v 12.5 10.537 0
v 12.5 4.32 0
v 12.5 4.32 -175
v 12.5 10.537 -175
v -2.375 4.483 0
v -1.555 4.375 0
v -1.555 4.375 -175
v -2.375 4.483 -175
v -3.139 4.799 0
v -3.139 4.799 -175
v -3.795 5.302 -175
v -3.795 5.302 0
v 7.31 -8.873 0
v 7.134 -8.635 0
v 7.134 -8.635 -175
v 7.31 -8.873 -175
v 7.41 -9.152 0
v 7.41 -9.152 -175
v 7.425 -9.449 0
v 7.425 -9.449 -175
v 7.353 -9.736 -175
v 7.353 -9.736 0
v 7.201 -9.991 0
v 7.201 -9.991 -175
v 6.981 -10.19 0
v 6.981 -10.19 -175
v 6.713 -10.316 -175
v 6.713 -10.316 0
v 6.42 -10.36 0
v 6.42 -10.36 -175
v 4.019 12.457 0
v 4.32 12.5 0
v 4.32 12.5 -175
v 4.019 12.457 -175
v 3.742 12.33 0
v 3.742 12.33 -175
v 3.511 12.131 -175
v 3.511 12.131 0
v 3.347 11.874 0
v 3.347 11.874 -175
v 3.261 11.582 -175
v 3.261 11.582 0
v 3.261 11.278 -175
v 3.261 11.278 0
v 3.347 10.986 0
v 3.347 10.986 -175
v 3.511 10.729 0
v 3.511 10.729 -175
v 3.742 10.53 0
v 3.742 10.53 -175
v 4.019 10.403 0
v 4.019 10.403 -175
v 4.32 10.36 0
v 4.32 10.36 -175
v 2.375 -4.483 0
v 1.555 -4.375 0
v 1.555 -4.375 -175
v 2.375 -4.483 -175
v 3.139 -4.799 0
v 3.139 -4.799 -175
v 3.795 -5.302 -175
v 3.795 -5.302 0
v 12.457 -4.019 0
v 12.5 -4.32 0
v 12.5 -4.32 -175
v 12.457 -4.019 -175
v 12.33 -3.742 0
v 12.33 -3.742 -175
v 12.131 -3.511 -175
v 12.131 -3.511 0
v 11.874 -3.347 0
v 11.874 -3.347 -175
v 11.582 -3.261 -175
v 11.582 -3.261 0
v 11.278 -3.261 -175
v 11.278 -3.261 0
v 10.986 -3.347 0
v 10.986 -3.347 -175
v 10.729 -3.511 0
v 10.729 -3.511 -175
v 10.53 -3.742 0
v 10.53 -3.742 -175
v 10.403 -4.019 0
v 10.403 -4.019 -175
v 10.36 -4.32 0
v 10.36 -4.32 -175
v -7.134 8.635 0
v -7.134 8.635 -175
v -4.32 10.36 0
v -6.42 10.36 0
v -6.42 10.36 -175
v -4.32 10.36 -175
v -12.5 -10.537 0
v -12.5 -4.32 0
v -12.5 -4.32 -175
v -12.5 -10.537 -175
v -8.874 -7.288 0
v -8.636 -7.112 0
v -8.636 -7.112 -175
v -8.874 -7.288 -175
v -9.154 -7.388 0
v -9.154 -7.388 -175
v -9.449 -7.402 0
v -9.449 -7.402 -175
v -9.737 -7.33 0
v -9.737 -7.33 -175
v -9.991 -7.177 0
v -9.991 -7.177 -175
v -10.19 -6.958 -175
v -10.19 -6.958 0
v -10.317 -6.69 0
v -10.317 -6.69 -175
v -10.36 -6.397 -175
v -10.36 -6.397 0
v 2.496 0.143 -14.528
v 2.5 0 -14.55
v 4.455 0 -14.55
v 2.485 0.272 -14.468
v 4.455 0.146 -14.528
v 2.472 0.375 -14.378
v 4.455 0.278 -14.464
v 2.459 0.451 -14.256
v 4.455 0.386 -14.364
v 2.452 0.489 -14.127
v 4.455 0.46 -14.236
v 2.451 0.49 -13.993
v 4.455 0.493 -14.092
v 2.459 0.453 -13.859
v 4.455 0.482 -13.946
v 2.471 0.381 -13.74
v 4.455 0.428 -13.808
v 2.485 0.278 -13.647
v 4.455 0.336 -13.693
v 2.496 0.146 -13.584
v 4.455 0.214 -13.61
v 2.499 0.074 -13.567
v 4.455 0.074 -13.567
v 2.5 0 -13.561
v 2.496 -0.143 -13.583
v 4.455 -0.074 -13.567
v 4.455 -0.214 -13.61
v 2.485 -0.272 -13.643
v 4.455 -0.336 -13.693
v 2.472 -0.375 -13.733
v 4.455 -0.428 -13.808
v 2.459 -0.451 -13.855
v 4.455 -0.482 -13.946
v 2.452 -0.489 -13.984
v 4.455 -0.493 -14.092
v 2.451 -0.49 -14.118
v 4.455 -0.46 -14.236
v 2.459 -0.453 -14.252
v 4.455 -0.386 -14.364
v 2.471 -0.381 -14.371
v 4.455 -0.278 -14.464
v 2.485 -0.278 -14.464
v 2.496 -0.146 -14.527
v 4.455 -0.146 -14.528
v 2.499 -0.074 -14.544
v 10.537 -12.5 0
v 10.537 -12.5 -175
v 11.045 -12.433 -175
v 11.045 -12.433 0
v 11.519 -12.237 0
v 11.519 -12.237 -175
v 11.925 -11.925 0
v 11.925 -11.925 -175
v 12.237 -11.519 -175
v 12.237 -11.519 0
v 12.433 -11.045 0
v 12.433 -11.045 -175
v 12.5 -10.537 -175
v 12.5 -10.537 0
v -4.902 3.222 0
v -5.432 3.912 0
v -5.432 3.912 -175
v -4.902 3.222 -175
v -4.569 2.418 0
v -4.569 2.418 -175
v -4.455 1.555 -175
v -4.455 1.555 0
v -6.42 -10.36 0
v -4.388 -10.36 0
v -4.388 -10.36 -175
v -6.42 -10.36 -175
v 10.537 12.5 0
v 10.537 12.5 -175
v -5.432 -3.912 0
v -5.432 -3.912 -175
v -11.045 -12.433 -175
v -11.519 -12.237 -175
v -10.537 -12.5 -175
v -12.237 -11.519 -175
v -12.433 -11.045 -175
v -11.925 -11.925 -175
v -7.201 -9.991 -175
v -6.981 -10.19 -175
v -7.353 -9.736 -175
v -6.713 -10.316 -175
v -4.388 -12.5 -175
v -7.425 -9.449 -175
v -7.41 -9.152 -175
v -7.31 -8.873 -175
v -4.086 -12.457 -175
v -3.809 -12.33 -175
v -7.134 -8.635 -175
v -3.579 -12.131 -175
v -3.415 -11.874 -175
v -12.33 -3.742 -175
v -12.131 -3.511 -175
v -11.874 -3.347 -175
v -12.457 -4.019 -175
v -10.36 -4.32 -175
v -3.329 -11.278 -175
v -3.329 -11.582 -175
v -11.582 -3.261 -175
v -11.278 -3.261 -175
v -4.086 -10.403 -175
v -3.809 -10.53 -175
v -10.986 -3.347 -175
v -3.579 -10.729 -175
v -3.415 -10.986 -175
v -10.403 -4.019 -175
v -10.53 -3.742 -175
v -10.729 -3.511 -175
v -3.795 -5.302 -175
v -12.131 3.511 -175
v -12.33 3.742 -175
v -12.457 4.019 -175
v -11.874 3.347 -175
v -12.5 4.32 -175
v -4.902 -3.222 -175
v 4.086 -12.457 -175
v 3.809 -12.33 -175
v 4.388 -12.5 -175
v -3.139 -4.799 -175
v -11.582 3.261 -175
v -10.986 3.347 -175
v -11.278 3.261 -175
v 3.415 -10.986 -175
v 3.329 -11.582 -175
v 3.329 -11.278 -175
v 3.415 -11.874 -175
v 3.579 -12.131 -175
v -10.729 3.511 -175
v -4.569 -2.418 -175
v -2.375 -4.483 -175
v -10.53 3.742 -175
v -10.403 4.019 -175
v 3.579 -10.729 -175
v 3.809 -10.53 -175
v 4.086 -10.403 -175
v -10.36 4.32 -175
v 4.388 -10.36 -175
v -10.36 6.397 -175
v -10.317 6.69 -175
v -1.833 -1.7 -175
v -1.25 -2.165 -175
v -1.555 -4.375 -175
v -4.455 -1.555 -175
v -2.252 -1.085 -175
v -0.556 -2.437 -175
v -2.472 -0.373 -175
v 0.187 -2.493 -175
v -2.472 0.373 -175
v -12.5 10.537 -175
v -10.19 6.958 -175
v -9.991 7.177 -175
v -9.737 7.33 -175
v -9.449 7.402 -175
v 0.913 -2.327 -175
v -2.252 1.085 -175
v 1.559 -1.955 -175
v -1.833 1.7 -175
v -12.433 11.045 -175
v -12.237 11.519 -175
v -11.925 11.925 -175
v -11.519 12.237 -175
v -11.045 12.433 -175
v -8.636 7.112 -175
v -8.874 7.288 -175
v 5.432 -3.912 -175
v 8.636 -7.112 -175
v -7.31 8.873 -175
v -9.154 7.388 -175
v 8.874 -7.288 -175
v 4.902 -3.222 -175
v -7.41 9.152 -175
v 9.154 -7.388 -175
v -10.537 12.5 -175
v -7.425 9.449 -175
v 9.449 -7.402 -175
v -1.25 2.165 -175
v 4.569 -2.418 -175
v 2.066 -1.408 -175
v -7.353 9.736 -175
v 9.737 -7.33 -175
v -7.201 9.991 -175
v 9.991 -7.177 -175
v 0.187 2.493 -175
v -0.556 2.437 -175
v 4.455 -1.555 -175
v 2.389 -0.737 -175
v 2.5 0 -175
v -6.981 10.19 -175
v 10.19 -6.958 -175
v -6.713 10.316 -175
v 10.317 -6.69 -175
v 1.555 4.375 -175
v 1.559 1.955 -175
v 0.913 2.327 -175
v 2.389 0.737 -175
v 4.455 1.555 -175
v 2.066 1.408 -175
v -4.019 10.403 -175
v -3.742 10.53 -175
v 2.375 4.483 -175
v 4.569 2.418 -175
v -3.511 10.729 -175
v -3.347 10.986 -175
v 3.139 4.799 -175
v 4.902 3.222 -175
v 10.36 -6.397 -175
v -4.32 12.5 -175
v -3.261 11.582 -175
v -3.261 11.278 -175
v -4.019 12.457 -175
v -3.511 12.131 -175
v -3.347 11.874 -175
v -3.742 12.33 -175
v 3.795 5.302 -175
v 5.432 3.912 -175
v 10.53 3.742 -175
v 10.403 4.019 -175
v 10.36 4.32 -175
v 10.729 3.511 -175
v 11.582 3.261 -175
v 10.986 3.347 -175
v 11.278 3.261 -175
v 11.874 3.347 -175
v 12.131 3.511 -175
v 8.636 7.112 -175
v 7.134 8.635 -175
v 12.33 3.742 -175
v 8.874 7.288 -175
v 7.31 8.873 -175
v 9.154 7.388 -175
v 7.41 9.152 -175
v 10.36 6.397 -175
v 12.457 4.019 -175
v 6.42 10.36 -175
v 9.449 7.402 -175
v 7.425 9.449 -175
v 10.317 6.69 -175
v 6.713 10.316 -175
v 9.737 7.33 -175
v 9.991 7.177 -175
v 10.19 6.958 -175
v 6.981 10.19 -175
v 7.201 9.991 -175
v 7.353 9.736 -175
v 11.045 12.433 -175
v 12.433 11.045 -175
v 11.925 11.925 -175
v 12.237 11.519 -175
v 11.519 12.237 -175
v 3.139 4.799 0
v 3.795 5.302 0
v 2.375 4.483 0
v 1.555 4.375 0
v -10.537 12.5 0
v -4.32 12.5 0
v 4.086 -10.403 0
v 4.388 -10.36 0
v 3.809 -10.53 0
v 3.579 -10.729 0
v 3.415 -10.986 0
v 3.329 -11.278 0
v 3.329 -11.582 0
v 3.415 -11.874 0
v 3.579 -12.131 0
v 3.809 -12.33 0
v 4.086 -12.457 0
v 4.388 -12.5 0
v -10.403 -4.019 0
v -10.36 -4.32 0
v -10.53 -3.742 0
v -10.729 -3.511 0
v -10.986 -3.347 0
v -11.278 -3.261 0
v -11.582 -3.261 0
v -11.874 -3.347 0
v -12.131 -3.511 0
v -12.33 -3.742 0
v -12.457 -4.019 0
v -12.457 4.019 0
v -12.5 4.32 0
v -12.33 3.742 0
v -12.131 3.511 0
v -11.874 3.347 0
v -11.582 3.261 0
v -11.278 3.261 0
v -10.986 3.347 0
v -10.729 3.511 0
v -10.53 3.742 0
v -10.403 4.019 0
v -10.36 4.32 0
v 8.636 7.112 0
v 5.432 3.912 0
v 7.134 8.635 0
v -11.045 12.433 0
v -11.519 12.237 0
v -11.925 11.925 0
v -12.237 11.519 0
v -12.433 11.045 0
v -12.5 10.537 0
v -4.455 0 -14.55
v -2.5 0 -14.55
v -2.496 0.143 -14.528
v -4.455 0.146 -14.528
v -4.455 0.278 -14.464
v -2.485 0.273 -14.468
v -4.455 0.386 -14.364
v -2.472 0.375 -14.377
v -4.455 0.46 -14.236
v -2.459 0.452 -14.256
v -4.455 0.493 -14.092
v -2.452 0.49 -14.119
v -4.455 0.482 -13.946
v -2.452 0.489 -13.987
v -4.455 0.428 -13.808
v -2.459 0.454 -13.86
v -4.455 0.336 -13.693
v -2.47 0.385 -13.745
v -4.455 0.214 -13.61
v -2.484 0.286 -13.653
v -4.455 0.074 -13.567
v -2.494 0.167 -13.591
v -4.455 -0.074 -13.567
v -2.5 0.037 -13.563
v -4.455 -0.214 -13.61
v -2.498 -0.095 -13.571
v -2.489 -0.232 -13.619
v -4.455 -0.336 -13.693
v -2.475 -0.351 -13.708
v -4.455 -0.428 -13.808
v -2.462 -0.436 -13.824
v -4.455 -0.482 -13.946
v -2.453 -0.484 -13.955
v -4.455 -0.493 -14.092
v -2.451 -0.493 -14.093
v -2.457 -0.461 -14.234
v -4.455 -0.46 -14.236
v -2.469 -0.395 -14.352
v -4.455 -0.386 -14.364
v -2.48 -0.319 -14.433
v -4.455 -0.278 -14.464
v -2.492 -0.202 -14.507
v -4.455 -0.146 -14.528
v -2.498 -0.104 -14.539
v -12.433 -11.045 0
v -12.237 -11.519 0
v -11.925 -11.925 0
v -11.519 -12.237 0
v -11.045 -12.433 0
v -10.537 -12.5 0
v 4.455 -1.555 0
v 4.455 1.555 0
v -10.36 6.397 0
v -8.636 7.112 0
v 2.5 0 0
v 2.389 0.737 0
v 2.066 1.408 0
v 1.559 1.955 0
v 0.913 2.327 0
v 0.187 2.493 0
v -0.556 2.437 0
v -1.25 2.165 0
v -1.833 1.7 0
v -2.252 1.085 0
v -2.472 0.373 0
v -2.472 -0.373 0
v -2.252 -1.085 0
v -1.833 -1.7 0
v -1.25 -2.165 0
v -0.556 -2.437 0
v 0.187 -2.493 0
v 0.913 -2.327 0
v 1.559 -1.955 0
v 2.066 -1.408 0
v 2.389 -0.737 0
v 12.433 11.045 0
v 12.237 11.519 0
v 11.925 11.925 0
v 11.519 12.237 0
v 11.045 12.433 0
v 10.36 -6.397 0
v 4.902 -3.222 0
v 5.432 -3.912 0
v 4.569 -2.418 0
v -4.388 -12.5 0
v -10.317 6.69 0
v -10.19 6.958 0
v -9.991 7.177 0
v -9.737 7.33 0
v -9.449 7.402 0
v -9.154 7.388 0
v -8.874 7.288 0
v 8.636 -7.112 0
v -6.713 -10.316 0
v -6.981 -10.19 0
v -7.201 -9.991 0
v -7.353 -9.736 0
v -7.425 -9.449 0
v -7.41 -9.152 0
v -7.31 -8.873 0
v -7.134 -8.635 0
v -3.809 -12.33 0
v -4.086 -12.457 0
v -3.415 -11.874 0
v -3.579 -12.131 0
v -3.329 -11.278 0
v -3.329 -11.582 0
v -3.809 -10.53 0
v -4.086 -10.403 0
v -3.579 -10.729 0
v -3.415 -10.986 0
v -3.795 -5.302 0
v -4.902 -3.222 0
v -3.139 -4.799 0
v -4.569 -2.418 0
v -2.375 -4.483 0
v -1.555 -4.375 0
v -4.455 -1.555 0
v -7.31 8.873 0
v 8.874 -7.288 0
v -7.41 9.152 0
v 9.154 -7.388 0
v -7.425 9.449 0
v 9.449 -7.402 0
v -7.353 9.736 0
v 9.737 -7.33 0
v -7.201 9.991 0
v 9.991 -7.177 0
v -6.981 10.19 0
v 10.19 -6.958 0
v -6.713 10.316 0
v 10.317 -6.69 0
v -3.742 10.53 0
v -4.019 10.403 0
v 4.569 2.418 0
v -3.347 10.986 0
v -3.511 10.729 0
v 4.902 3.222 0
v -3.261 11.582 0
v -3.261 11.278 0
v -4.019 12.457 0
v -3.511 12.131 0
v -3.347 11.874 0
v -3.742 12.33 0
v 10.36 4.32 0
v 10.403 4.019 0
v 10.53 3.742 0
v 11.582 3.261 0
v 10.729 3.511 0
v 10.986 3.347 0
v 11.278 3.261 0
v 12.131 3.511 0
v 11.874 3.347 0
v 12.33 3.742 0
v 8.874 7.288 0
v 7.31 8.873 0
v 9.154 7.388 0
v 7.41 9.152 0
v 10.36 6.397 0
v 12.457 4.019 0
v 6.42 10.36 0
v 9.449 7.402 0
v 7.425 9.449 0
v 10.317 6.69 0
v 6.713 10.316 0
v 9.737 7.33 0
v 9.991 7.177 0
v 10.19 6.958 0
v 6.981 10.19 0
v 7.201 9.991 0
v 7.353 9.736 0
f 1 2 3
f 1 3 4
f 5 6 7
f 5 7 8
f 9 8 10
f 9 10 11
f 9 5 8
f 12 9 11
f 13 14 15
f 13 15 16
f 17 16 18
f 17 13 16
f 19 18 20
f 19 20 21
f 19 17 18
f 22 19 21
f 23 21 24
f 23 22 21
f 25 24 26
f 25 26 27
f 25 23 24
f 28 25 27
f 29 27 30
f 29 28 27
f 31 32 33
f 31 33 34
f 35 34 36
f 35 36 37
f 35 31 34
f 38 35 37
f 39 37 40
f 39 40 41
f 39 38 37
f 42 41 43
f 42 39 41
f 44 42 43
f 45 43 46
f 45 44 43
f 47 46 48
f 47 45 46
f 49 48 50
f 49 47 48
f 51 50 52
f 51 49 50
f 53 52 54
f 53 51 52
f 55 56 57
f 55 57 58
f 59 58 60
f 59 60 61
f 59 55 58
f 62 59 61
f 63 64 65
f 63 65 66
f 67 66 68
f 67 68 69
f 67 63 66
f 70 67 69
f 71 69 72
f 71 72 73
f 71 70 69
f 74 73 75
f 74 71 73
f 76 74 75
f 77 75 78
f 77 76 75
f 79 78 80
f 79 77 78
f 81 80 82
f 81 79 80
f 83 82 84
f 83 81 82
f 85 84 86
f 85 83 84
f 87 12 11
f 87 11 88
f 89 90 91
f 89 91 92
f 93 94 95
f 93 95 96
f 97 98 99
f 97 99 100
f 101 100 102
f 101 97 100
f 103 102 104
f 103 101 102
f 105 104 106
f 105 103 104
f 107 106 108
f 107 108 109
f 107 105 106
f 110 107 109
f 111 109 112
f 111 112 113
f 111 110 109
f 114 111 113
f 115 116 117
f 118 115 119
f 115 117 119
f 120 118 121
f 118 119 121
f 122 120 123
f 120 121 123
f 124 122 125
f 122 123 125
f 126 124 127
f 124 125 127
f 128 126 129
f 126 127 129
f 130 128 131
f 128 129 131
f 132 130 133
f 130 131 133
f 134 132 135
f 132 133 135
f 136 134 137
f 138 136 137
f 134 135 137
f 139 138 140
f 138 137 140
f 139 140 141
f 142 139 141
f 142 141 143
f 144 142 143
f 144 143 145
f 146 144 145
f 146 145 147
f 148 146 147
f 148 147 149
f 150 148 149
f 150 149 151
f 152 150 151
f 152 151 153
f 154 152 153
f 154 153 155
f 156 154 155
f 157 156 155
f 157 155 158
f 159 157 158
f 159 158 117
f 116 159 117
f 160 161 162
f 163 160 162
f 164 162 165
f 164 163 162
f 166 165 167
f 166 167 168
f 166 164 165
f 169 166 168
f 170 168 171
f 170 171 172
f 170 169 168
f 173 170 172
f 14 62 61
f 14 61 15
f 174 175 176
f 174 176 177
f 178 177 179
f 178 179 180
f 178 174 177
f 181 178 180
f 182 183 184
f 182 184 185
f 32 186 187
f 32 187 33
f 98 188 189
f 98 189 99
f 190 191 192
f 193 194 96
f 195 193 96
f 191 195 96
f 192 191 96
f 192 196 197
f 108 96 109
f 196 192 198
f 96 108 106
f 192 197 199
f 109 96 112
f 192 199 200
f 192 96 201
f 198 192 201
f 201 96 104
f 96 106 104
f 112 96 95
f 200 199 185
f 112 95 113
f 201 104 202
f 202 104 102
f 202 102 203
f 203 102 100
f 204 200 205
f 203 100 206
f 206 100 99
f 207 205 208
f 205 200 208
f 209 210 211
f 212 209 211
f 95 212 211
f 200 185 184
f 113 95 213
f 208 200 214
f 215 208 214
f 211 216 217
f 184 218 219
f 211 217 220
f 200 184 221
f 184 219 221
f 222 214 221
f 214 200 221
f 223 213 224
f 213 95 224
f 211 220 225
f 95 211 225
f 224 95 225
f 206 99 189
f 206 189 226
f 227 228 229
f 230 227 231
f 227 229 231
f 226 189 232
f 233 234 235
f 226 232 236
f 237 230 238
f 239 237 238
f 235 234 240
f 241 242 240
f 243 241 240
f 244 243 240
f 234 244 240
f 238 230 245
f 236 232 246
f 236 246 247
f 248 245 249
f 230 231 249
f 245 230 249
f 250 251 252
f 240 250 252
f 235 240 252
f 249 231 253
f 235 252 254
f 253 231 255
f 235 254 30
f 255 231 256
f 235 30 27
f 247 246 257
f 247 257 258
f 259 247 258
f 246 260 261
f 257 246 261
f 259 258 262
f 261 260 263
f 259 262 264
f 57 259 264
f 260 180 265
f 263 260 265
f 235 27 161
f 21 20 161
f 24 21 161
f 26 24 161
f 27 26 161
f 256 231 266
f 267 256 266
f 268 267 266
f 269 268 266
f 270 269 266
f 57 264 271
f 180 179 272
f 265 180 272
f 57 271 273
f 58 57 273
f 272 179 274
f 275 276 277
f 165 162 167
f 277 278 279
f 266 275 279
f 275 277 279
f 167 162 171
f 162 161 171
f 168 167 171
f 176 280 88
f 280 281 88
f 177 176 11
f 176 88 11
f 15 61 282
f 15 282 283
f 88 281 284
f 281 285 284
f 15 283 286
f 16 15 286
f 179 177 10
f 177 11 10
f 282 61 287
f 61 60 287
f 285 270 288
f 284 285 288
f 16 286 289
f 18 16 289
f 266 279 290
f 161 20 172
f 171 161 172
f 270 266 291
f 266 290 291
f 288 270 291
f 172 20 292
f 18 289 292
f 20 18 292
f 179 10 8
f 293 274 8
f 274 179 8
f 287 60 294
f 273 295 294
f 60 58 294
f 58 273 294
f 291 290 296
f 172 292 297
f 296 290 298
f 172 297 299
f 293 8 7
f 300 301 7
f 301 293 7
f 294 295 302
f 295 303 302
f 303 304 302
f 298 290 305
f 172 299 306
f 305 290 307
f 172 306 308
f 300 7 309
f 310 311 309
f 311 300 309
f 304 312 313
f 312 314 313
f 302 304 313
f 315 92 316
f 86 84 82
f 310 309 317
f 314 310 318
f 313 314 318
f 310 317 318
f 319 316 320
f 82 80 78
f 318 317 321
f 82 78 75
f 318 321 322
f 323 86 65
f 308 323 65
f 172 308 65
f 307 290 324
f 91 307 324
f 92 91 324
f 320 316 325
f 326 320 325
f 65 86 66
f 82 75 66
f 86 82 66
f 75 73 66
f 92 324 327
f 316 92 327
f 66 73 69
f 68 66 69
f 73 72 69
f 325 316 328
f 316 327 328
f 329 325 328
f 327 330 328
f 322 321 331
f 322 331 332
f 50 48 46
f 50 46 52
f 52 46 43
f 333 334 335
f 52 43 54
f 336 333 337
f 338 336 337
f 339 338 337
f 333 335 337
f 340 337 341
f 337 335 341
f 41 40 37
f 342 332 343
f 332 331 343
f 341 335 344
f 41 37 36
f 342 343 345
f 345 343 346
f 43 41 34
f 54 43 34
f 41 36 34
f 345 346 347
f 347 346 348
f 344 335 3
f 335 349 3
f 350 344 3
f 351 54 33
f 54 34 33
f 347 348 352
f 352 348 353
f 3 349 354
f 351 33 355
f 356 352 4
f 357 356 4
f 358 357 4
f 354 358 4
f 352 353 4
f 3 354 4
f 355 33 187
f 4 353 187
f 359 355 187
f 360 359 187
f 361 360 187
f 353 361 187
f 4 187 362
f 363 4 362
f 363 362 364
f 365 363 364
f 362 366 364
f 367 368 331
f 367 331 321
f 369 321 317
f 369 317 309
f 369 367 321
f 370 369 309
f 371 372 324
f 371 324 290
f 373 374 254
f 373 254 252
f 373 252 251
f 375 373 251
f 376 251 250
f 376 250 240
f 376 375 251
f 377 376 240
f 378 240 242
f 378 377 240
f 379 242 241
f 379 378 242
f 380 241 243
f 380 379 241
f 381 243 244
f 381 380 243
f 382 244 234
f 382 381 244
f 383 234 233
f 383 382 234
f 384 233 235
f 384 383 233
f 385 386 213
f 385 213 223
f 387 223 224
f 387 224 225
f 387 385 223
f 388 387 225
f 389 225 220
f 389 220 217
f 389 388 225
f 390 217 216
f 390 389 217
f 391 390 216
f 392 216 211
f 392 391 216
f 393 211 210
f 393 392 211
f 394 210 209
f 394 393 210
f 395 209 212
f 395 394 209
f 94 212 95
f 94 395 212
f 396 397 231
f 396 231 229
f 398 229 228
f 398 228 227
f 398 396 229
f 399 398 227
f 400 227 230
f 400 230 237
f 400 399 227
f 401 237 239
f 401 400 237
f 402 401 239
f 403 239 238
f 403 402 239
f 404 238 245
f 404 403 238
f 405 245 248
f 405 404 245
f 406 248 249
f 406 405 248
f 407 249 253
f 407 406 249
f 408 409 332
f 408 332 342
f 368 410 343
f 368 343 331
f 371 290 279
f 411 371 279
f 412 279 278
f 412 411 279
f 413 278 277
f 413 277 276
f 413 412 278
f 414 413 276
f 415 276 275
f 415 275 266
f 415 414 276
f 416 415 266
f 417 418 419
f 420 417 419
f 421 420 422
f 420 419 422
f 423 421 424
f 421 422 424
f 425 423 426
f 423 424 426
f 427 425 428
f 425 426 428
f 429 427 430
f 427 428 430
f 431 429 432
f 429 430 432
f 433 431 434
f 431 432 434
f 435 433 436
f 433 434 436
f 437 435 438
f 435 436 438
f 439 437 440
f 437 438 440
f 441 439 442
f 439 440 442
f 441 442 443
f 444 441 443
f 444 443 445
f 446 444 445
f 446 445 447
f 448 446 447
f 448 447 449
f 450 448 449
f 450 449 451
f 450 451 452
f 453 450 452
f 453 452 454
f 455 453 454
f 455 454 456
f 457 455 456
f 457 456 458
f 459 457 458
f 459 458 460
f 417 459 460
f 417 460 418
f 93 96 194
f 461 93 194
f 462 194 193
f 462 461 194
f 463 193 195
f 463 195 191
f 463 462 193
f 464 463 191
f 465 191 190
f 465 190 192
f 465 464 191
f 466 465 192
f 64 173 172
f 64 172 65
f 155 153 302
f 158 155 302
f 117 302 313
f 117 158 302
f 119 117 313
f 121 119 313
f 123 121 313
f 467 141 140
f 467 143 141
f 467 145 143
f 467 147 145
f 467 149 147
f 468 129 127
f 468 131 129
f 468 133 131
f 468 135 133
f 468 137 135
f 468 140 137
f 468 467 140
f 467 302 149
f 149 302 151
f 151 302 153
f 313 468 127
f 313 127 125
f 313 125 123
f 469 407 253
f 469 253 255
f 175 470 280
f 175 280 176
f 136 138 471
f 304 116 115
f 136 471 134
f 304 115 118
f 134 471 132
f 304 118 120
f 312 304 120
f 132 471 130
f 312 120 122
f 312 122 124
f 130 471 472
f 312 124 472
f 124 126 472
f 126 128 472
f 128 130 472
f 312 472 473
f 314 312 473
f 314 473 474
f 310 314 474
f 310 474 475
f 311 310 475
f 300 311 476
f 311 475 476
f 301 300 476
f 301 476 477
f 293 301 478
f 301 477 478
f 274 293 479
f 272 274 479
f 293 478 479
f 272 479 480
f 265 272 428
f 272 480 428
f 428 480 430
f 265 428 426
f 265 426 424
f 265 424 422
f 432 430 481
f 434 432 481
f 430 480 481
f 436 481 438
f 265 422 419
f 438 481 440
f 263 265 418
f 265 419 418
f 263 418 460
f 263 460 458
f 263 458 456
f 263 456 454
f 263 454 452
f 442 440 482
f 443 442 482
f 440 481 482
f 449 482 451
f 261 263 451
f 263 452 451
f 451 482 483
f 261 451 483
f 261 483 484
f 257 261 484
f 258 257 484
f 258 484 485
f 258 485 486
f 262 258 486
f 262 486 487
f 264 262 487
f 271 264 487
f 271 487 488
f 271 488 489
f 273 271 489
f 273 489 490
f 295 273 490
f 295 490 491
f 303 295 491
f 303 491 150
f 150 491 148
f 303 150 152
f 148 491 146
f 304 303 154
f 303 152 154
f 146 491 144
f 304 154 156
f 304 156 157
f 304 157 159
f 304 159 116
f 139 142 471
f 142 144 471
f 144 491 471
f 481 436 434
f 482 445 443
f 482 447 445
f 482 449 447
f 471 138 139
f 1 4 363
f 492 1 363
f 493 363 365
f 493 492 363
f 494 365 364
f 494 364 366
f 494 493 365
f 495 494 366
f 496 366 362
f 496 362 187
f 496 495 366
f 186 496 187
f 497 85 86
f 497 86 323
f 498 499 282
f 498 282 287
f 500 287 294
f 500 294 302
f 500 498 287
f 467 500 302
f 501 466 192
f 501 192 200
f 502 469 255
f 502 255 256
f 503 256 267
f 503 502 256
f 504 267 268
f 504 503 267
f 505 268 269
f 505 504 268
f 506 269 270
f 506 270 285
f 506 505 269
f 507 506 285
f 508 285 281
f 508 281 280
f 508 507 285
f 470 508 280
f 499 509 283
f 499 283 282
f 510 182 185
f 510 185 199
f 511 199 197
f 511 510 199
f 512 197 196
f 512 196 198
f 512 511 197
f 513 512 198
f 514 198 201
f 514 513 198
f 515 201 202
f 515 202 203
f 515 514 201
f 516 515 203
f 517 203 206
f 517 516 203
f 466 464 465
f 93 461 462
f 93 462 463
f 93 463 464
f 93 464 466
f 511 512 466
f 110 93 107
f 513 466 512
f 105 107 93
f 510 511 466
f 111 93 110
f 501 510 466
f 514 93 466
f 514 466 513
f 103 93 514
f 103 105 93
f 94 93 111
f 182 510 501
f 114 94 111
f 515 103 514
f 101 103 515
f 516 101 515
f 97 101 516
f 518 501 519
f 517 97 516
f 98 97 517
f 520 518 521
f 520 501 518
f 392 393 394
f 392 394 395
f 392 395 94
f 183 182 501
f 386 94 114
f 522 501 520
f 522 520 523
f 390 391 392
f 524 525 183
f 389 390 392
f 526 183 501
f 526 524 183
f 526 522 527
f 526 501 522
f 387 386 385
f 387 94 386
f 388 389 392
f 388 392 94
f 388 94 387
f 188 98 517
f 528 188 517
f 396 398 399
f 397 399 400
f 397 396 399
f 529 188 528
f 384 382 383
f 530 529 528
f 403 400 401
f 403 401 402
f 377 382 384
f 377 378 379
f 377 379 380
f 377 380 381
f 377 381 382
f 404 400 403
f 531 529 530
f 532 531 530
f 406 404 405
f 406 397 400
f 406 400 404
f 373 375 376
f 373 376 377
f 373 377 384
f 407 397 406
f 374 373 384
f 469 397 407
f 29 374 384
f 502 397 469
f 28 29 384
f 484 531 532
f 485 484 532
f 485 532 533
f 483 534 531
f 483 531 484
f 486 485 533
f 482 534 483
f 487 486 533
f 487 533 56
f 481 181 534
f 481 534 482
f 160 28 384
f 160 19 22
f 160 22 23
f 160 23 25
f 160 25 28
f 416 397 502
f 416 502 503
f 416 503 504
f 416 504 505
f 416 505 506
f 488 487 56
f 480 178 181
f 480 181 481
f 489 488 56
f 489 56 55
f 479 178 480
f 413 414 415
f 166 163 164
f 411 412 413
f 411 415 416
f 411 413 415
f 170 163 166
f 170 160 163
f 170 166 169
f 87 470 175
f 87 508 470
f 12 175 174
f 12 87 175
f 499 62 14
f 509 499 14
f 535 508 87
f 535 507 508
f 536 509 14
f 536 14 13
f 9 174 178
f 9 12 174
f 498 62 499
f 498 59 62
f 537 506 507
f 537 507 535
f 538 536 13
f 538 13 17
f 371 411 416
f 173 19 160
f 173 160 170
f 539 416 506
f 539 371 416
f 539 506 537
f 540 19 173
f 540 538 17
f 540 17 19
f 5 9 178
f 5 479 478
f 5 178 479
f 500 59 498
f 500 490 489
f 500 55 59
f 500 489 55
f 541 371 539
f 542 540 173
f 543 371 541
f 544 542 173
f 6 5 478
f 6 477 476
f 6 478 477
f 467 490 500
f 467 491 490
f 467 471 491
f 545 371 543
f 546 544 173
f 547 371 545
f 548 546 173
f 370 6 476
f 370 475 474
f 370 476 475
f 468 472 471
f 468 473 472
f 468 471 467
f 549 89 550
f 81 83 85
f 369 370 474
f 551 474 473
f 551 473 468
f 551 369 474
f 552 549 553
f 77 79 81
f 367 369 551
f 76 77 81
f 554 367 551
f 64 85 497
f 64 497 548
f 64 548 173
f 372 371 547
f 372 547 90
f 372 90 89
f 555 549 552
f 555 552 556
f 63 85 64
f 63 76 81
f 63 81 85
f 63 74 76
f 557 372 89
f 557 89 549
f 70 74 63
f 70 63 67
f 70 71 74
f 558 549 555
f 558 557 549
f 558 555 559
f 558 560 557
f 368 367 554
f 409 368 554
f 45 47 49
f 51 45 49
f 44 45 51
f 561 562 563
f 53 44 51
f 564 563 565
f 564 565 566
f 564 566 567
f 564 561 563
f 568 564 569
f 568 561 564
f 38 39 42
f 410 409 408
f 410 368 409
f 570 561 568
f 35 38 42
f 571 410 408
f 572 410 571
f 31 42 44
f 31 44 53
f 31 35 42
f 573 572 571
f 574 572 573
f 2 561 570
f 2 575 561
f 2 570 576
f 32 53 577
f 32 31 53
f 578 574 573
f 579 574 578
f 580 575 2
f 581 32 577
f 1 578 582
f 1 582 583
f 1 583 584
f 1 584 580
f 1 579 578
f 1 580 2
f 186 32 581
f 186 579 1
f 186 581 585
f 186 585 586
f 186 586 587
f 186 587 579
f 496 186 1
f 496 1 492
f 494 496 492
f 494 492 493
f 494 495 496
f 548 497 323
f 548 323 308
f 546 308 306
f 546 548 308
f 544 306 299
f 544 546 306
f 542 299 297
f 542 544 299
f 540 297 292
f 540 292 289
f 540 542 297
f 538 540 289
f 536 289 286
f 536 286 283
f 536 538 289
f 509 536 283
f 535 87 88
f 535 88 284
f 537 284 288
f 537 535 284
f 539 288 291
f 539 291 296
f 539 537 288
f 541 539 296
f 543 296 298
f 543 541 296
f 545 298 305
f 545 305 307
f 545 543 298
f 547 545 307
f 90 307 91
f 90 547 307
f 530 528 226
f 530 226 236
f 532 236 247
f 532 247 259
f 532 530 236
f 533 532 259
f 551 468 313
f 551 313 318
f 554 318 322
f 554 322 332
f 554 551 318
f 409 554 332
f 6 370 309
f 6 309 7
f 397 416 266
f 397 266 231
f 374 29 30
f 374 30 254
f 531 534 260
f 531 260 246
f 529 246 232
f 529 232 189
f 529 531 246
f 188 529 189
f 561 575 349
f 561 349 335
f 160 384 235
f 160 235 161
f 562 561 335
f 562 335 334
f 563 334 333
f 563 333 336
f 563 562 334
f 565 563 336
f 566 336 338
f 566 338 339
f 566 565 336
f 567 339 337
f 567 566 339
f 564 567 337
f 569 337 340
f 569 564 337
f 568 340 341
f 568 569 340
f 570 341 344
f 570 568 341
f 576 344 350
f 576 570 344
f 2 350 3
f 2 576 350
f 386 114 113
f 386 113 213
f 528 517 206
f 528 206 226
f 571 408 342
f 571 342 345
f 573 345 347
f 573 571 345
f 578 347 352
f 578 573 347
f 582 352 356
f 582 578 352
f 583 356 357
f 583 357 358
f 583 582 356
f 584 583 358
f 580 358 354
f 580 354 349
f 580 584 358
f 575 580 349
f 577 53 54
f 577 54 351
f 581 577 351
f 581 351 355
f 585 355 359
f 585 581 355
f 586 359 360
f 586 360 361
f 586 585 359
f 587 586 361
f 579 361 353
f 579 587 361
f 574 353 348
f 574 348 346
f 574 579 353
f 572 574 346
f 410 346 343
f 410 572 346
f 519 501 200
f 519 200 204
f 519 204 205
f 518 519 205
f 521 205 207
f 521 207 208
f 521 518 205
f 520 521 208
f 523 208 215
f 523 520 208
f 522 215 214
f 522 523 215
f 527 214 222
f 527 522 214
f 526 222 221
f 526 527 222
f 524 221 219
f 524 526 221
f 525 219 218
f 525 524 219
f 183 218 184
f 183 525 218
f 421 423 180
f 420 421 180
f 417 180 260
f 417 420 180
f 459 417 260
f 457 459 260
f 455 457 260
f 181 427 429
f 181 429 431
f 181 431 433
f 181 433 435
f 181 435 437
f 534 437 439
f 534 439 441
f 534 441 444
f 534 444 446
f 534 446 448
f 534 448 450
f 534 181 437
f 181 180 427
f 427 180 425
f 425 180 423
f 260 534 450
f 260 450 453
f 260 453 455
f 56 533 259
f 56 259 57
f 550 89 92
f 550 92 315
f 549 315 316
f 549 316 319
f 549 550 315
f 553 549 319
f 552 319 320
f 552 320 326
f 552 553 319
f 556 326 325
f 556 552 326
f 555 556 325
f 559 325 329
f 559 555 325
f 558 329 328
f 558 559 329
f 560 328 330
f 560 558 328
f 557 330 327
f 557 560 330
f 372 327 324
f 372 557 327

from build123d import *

# Parameters (mm, degrees)
SKETCH1_R          = 2.5
EXTRUDE1_DEPTH     = 175
SKETCH2_R          = 0.494082288
CUT_EXTRUDE1_DEPTH = 177.263218015


with BuildPart() as part:
    # Sketch1 → Extrude1 (new body)
    with BuildSketch(Plane.XY):
        with BuildLine():
            Line((-8.636346088, 7.111588351), (-5.432204773, 3.912143135))
            ThreePointArc((-5.432204773, 3.912143135), (-4.708985779, 2.831057106), (-4.455, 1.555406707))
            Line((-4.455, 1.555406707), (-4.455, -1.555406707))
            ThreePointArc((-4.455, -1.555406707), (-4.708985779, -2.831057106), (-5.432204773, -3.912143135))
            Line((-5.432204773, -3.912143135), (-8.636346088, -7.111588351))
            ThreePointArc((-8.636346088, -7.111588351), (-9.736852394, -7.329863489), (-10.36, -6.396886949))
            Line((-10.36, -6.396886949), (-10.36, -4.32))
            ThreePointArc((-10.36, -4.32), (-11.43, -3.25), (-12.5, -4.32))
            Line((-12.5, -4.32), (-12.5, -8.651801989))
            Line((-12.5, -8.651801989), (-12.5, -10.537068835))
            ThreePointArc((-12.5, -10.537068835), (-11.925070773, -11.925070773), (-10.537068835, -12.5))
            Line((-10.537068835, -12.5), (-8.441567612, -12.5))
            Line((-8.441567612, -12.5), (-4.387856959, -12.5))
            ThreePointArc((-4.387856959, -12.5), (-3.317856959, -11.43), (-4.387856959, -10.36))
            Line((-4.387856959, -10.36), (-6.42, -10.36))
            ThreePointArc((-6.42, -10.36), (-7.35325999, -9.736168088), (-7.133653912, -8.635298598))
            Line((-7.133653912, -8.635298598), (-3.795290766, -5.301828272))
            ThreePointArc((-3.795290766, -5.301828272), (-2.76743922, -4.61585726), (-1.555406707, -4.375))
            Line((-1.555406707, -4.375), (1.555406707, -4.375))
            ThreePointArc((1.555406707, -4.375), (2.76743922, -4.61585726), (3.795290766, -5.301828272))
            Line((3.795290766, -5.301828272), (7.133653912, -8.635298598))
            ThreePointArc((7.133653912, -8.635298598), (7.35325999, -9.736168088), (6.42, -10.36))
            Line((6.42, -10.36), (4.387856959, -10.36))
            ThreePointArc((4.387856959, -10.36), (3.317856959, -11.43), (4.387856959, -12.5))
            Line((4.387856959, -12.5), (8.441567612, -12.5))
            Line((8.441567612, -12.5), (10.537068835, -12.5))
            ThreePointArc((10.537068835, -12.5), (11.925070773, -11.925070773), (12.5, -10.537068835))
            Line((12.5, -10.537068835), (12.5, -8.651801989))
            Line((12.5, -8.651801989), (12.5, -4.32))
            ThreePointArc((12.5, -4.32), (11.43, -3.25), (10.36, -4.32))
            Line((10.36, -4.32), (10.36, -6.396886949))
            ThreePointArc((10.36, -6.396886949), (9.736852394, -7.329863489), (8.636346088, -7.111588351))
            Line((8.636346088, -7.111588351), (5.432204773, -3.912143135))
            ThreePointArc((5.432204773, -3.912143135), (4.708985779, -2.831057106), (4.455, -1.555406707))
            Line((4.455, -1.555406707), (4.455, 1.555406707))
            ThreePointArc((4.455, 1.555406707), (4.708985779, 2.831057106), (5.432204773, 3.912143135))
            Line((5.432204773, 3.912143135), (8.636346088, 7.111588351))
            ThreePointArc((8.636346088, 7.111588351), (9.736852394, 7.329863489), (10.36, 6.396886949))
            Line((10.36, 6.396886949), (10.36, 4.32))
            ThreePointArc((10.36, 4.32), (11.43, 3.25), (12.5, 4.32))
            Line((12.5, 4.32), (12.5, 7.99129648))
            Line((12.5, 7.99129648), (12.5, 10.537068835))
            ThreePointArc((12.5, 10.537068835), (11.925070773, 11.925070773), (10.537068835, 12.5))
            Line((10.537068835, 12.5), (4.32, 12.5))
            ThreePointArc((4.32, 12.5), (3.25, 11.43), (4.32, 10.36))
            Line((4.32, 10.36), (6.42, 10.36))
            ThreePointArc((6.42, 10.36), (7.35325999, 9.736168088), (7.133653912, 8.635298598))
            Line((7.133653912, 8.635298598), (3.795290766, 5.301828272))
            ThreePointArc((3.795290766, 5.301828272), (2.76743922, 4.61585726), (1.555406707, 4.375))
            Line((1.555406707, 4.375), (-1.555406707, 4.375))
            ThreePointArc((-1.555406707, 4.375), (-2.76743922, 4.61585726), (-3.795290766, 5.301828272))
            Line((-3.795290766, 5.301828272), (-7.133653912, 8.635298598))
            ThreePointArc((-7.133653912, 8.635298598), (-7.35325999, 9.736168088), (-6.42, 10.36))
            Line((-6.42, 10.36), (-4.32, 10.36))
            ThreePointArc((-4.32, 10.36), (-3.25, 11.43), (-4.32, 12.5))
            Line((-4.32, 12.5), (-10.537068835, 12.5))
            ThreePointArc((-10.537068835, 12.5), (-11.925070773, 11.925070773), (-12.5, 10.537068835))
            Line((-12.5, 10.537068835), (-12.5, 7.99129648))
            Line((-12.5, 7.99129648), (-12.5, 4.32))
            ThreePointArc((-12.5, 4.32), (-11.43, 3.25), (-10.36, 4.32))
            Line((-10.36, 4.32), (-10.36, 6.396886949))
            ThreePointArc((-10.36, 6.396886949), (-9.736852394, 7.329863489), (-8.636346088, 7.111588351))
        make_face()
        Circle(SKETCH1_R, mode=Mode.SUBTRACT)
    extrude(amount=-EXTRUDE1_DEPTH)

    # Sketch2 → Cut-Extrude1 (cut, through all)
    with BuildSketch(Plane(origin=(4.455, 0, 0), x_dir=(0, 0, -1), z_dir=(1, 0, 0))):
        with Locations((14.055513528, 0)):
            Circle(SKETCH2_R)
    extrude(amount=-CUT_EXTRUDE1_DEPTH, mode=Mode.SUBTRACT)


solid = part.part
